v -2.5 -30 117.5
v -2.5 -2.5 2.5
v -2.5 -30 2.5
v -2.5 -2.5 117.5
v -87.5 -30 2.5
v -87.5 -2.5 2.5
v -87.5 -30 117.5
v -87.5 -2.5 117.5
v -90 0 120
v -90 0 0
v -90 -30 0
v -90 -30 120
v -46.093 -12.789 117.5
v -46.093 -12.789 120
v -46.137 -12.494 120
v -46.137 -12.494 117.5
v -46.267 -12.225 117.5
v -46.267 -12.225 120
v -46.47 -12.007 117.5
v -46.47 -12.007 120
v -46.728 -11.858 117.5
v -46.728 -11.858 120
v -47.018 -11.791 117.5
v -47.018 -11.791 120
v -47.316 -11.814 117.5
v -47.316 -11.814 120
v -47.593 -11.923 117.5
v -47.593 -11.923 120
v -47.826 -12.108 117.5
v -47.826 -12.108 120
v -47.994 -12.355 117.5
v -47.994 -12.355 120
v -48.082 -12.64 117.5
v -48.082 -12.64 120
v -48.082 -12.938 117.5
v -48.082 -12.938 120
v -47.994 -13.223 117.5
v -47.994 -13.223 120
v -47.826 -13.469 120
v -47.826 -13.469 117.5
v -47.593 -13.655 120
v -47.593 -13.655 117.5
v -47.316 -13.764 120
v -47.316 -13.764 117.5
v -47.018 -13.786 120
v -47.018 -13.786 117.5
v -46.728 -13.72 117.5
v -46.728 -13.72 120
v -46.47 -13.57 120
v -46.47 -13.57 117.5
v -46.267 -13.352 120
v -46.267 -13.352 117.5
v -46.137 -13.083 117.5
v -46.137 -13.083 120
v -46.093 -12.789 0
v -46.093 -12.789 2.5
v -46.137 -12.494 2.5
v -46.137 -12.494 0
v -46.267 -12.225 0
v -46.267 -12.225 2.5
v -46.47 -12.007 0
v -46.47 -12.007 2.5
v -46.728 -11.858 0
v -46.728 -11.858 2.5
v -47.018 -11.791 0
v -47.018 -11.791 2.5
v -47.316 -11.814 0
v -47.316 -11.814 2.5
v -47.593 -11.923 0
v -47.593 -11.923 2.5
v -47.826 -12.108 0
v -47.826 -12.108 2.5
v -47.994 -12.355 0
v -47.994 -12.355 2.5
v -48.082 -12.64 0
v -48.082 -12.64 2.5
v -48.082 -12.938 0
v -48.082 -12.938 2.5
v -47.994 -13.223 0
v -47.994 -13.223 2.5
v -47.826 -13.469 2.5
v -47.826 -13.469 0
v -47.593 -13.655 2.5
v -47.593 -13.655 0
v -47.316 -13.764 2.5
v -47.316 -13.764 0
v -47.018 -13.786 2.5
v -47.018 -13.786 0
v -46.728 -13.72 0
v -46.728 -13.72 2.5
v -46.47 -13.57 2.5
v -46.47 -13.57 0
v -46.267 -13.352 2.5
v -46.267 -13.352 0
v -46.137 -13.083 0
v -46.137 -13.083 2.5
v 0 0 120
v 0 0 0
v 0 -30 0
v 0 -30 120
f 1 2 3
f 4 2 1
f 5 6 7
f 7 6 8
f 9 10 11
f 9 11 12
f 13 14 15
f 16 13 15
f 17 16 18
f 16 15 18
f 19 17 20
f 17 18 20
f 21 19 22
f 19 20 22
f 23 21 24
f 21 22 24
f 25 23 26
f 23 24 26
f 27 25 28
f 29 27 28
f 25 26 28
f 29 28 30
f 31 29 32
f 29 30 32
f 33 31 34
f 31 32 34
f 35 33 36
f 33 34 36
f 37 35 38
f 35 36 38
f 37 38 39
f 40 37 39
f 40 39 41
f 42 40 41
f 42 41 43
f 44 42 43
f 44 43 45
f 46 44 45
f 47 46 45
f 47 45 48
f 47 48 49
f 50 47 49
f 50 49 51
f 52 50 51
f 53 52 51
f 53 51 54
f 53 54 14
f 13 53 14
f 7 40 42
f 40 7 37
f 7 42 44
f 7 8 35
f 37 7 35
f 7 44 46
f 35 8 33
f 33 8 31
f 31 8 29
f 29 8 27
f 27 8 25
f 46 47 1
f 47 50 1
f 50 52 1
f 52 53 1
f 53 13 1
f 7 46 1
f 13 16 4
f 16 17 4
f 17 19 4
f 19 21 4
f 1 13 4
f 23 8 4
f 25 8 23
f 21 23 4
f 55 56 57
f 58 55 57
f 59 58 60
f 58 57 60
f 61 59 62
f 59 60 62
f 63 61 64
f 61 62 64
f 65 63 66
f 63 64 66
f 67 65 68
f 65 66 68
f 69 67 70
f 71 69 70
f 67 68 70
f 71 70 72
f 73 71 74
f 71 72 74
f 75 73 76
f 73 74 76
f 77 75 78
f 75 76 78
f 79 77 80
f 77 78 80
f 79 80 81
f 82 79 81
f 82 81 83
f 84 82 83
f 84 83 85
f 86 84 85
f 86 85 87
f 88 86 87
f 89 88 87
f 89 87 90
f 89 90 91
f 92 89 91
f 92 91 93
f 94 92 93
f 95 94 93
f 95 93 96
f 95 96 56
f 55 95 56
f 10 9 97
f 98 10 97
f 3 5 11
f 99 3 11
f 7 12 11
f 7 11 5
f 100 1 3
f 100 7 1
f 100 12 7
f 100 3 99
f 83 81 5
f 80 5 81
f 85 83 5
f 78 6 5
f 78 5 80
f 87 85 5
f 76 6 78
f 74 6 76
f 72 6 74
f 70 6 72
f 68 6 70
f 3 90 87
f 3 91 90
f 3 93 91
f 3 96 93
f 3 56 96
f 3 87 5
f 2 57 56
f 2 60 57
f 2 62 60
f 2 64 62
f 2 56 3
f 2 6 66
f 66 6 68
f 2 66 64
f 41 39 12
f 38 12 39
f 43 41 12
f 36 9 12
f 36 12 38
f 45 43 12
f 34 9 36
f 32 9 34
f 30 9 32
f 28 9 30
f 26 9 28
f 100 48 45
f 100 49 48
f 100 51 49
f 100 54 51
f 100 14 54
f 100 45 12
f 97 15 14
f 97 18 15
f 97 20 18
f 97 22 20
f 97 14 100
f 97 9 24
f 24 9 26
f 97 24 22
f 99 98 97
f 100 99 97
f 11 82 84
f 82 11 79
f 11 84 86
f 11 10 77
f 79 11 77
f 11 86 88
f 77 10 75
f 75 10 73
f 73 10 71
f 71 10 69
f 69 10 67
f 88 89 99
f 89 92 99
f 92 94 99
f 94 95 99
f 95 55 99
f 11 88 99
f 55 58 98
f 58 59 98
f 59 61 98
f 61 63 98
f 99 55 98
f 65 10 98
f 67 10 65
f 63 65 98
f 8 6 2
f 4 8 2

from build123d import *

# Parameters (mm, degrees)
F0_W     = 90
F0_H     = 120
F1_DEPTH = 30
F2_T     = -2.5
F3_R     = 1
F4_DEPTH = 120.001


with BuildPart() as f1:
    # F0 (on Front) → F1 (new body)
    with BuildSketch(Plane.XZ):
        with Locations((-45, 60)):
            Rectangle(F0_W, F0_H)
    extrude(amount=F1_DEPTH)

    # F2
    f2_openings = [f1.faces().sort_by_distance(p)[0] for p in [
        (-45, -30, 60),
    ]]
    offset(amount=F2_T, openings=f2_openings)

    # F3 (on face) → F4 (cut, through all)
    with BuildSketch(Plane.XY.offset(120)):
        with Locations((-47.093008, -12.78865)):
            Circle(F3_R)
    extrude(amount=-F4_DEPTH, mode=Mode.SUBTRACT)


solid = f1.part
